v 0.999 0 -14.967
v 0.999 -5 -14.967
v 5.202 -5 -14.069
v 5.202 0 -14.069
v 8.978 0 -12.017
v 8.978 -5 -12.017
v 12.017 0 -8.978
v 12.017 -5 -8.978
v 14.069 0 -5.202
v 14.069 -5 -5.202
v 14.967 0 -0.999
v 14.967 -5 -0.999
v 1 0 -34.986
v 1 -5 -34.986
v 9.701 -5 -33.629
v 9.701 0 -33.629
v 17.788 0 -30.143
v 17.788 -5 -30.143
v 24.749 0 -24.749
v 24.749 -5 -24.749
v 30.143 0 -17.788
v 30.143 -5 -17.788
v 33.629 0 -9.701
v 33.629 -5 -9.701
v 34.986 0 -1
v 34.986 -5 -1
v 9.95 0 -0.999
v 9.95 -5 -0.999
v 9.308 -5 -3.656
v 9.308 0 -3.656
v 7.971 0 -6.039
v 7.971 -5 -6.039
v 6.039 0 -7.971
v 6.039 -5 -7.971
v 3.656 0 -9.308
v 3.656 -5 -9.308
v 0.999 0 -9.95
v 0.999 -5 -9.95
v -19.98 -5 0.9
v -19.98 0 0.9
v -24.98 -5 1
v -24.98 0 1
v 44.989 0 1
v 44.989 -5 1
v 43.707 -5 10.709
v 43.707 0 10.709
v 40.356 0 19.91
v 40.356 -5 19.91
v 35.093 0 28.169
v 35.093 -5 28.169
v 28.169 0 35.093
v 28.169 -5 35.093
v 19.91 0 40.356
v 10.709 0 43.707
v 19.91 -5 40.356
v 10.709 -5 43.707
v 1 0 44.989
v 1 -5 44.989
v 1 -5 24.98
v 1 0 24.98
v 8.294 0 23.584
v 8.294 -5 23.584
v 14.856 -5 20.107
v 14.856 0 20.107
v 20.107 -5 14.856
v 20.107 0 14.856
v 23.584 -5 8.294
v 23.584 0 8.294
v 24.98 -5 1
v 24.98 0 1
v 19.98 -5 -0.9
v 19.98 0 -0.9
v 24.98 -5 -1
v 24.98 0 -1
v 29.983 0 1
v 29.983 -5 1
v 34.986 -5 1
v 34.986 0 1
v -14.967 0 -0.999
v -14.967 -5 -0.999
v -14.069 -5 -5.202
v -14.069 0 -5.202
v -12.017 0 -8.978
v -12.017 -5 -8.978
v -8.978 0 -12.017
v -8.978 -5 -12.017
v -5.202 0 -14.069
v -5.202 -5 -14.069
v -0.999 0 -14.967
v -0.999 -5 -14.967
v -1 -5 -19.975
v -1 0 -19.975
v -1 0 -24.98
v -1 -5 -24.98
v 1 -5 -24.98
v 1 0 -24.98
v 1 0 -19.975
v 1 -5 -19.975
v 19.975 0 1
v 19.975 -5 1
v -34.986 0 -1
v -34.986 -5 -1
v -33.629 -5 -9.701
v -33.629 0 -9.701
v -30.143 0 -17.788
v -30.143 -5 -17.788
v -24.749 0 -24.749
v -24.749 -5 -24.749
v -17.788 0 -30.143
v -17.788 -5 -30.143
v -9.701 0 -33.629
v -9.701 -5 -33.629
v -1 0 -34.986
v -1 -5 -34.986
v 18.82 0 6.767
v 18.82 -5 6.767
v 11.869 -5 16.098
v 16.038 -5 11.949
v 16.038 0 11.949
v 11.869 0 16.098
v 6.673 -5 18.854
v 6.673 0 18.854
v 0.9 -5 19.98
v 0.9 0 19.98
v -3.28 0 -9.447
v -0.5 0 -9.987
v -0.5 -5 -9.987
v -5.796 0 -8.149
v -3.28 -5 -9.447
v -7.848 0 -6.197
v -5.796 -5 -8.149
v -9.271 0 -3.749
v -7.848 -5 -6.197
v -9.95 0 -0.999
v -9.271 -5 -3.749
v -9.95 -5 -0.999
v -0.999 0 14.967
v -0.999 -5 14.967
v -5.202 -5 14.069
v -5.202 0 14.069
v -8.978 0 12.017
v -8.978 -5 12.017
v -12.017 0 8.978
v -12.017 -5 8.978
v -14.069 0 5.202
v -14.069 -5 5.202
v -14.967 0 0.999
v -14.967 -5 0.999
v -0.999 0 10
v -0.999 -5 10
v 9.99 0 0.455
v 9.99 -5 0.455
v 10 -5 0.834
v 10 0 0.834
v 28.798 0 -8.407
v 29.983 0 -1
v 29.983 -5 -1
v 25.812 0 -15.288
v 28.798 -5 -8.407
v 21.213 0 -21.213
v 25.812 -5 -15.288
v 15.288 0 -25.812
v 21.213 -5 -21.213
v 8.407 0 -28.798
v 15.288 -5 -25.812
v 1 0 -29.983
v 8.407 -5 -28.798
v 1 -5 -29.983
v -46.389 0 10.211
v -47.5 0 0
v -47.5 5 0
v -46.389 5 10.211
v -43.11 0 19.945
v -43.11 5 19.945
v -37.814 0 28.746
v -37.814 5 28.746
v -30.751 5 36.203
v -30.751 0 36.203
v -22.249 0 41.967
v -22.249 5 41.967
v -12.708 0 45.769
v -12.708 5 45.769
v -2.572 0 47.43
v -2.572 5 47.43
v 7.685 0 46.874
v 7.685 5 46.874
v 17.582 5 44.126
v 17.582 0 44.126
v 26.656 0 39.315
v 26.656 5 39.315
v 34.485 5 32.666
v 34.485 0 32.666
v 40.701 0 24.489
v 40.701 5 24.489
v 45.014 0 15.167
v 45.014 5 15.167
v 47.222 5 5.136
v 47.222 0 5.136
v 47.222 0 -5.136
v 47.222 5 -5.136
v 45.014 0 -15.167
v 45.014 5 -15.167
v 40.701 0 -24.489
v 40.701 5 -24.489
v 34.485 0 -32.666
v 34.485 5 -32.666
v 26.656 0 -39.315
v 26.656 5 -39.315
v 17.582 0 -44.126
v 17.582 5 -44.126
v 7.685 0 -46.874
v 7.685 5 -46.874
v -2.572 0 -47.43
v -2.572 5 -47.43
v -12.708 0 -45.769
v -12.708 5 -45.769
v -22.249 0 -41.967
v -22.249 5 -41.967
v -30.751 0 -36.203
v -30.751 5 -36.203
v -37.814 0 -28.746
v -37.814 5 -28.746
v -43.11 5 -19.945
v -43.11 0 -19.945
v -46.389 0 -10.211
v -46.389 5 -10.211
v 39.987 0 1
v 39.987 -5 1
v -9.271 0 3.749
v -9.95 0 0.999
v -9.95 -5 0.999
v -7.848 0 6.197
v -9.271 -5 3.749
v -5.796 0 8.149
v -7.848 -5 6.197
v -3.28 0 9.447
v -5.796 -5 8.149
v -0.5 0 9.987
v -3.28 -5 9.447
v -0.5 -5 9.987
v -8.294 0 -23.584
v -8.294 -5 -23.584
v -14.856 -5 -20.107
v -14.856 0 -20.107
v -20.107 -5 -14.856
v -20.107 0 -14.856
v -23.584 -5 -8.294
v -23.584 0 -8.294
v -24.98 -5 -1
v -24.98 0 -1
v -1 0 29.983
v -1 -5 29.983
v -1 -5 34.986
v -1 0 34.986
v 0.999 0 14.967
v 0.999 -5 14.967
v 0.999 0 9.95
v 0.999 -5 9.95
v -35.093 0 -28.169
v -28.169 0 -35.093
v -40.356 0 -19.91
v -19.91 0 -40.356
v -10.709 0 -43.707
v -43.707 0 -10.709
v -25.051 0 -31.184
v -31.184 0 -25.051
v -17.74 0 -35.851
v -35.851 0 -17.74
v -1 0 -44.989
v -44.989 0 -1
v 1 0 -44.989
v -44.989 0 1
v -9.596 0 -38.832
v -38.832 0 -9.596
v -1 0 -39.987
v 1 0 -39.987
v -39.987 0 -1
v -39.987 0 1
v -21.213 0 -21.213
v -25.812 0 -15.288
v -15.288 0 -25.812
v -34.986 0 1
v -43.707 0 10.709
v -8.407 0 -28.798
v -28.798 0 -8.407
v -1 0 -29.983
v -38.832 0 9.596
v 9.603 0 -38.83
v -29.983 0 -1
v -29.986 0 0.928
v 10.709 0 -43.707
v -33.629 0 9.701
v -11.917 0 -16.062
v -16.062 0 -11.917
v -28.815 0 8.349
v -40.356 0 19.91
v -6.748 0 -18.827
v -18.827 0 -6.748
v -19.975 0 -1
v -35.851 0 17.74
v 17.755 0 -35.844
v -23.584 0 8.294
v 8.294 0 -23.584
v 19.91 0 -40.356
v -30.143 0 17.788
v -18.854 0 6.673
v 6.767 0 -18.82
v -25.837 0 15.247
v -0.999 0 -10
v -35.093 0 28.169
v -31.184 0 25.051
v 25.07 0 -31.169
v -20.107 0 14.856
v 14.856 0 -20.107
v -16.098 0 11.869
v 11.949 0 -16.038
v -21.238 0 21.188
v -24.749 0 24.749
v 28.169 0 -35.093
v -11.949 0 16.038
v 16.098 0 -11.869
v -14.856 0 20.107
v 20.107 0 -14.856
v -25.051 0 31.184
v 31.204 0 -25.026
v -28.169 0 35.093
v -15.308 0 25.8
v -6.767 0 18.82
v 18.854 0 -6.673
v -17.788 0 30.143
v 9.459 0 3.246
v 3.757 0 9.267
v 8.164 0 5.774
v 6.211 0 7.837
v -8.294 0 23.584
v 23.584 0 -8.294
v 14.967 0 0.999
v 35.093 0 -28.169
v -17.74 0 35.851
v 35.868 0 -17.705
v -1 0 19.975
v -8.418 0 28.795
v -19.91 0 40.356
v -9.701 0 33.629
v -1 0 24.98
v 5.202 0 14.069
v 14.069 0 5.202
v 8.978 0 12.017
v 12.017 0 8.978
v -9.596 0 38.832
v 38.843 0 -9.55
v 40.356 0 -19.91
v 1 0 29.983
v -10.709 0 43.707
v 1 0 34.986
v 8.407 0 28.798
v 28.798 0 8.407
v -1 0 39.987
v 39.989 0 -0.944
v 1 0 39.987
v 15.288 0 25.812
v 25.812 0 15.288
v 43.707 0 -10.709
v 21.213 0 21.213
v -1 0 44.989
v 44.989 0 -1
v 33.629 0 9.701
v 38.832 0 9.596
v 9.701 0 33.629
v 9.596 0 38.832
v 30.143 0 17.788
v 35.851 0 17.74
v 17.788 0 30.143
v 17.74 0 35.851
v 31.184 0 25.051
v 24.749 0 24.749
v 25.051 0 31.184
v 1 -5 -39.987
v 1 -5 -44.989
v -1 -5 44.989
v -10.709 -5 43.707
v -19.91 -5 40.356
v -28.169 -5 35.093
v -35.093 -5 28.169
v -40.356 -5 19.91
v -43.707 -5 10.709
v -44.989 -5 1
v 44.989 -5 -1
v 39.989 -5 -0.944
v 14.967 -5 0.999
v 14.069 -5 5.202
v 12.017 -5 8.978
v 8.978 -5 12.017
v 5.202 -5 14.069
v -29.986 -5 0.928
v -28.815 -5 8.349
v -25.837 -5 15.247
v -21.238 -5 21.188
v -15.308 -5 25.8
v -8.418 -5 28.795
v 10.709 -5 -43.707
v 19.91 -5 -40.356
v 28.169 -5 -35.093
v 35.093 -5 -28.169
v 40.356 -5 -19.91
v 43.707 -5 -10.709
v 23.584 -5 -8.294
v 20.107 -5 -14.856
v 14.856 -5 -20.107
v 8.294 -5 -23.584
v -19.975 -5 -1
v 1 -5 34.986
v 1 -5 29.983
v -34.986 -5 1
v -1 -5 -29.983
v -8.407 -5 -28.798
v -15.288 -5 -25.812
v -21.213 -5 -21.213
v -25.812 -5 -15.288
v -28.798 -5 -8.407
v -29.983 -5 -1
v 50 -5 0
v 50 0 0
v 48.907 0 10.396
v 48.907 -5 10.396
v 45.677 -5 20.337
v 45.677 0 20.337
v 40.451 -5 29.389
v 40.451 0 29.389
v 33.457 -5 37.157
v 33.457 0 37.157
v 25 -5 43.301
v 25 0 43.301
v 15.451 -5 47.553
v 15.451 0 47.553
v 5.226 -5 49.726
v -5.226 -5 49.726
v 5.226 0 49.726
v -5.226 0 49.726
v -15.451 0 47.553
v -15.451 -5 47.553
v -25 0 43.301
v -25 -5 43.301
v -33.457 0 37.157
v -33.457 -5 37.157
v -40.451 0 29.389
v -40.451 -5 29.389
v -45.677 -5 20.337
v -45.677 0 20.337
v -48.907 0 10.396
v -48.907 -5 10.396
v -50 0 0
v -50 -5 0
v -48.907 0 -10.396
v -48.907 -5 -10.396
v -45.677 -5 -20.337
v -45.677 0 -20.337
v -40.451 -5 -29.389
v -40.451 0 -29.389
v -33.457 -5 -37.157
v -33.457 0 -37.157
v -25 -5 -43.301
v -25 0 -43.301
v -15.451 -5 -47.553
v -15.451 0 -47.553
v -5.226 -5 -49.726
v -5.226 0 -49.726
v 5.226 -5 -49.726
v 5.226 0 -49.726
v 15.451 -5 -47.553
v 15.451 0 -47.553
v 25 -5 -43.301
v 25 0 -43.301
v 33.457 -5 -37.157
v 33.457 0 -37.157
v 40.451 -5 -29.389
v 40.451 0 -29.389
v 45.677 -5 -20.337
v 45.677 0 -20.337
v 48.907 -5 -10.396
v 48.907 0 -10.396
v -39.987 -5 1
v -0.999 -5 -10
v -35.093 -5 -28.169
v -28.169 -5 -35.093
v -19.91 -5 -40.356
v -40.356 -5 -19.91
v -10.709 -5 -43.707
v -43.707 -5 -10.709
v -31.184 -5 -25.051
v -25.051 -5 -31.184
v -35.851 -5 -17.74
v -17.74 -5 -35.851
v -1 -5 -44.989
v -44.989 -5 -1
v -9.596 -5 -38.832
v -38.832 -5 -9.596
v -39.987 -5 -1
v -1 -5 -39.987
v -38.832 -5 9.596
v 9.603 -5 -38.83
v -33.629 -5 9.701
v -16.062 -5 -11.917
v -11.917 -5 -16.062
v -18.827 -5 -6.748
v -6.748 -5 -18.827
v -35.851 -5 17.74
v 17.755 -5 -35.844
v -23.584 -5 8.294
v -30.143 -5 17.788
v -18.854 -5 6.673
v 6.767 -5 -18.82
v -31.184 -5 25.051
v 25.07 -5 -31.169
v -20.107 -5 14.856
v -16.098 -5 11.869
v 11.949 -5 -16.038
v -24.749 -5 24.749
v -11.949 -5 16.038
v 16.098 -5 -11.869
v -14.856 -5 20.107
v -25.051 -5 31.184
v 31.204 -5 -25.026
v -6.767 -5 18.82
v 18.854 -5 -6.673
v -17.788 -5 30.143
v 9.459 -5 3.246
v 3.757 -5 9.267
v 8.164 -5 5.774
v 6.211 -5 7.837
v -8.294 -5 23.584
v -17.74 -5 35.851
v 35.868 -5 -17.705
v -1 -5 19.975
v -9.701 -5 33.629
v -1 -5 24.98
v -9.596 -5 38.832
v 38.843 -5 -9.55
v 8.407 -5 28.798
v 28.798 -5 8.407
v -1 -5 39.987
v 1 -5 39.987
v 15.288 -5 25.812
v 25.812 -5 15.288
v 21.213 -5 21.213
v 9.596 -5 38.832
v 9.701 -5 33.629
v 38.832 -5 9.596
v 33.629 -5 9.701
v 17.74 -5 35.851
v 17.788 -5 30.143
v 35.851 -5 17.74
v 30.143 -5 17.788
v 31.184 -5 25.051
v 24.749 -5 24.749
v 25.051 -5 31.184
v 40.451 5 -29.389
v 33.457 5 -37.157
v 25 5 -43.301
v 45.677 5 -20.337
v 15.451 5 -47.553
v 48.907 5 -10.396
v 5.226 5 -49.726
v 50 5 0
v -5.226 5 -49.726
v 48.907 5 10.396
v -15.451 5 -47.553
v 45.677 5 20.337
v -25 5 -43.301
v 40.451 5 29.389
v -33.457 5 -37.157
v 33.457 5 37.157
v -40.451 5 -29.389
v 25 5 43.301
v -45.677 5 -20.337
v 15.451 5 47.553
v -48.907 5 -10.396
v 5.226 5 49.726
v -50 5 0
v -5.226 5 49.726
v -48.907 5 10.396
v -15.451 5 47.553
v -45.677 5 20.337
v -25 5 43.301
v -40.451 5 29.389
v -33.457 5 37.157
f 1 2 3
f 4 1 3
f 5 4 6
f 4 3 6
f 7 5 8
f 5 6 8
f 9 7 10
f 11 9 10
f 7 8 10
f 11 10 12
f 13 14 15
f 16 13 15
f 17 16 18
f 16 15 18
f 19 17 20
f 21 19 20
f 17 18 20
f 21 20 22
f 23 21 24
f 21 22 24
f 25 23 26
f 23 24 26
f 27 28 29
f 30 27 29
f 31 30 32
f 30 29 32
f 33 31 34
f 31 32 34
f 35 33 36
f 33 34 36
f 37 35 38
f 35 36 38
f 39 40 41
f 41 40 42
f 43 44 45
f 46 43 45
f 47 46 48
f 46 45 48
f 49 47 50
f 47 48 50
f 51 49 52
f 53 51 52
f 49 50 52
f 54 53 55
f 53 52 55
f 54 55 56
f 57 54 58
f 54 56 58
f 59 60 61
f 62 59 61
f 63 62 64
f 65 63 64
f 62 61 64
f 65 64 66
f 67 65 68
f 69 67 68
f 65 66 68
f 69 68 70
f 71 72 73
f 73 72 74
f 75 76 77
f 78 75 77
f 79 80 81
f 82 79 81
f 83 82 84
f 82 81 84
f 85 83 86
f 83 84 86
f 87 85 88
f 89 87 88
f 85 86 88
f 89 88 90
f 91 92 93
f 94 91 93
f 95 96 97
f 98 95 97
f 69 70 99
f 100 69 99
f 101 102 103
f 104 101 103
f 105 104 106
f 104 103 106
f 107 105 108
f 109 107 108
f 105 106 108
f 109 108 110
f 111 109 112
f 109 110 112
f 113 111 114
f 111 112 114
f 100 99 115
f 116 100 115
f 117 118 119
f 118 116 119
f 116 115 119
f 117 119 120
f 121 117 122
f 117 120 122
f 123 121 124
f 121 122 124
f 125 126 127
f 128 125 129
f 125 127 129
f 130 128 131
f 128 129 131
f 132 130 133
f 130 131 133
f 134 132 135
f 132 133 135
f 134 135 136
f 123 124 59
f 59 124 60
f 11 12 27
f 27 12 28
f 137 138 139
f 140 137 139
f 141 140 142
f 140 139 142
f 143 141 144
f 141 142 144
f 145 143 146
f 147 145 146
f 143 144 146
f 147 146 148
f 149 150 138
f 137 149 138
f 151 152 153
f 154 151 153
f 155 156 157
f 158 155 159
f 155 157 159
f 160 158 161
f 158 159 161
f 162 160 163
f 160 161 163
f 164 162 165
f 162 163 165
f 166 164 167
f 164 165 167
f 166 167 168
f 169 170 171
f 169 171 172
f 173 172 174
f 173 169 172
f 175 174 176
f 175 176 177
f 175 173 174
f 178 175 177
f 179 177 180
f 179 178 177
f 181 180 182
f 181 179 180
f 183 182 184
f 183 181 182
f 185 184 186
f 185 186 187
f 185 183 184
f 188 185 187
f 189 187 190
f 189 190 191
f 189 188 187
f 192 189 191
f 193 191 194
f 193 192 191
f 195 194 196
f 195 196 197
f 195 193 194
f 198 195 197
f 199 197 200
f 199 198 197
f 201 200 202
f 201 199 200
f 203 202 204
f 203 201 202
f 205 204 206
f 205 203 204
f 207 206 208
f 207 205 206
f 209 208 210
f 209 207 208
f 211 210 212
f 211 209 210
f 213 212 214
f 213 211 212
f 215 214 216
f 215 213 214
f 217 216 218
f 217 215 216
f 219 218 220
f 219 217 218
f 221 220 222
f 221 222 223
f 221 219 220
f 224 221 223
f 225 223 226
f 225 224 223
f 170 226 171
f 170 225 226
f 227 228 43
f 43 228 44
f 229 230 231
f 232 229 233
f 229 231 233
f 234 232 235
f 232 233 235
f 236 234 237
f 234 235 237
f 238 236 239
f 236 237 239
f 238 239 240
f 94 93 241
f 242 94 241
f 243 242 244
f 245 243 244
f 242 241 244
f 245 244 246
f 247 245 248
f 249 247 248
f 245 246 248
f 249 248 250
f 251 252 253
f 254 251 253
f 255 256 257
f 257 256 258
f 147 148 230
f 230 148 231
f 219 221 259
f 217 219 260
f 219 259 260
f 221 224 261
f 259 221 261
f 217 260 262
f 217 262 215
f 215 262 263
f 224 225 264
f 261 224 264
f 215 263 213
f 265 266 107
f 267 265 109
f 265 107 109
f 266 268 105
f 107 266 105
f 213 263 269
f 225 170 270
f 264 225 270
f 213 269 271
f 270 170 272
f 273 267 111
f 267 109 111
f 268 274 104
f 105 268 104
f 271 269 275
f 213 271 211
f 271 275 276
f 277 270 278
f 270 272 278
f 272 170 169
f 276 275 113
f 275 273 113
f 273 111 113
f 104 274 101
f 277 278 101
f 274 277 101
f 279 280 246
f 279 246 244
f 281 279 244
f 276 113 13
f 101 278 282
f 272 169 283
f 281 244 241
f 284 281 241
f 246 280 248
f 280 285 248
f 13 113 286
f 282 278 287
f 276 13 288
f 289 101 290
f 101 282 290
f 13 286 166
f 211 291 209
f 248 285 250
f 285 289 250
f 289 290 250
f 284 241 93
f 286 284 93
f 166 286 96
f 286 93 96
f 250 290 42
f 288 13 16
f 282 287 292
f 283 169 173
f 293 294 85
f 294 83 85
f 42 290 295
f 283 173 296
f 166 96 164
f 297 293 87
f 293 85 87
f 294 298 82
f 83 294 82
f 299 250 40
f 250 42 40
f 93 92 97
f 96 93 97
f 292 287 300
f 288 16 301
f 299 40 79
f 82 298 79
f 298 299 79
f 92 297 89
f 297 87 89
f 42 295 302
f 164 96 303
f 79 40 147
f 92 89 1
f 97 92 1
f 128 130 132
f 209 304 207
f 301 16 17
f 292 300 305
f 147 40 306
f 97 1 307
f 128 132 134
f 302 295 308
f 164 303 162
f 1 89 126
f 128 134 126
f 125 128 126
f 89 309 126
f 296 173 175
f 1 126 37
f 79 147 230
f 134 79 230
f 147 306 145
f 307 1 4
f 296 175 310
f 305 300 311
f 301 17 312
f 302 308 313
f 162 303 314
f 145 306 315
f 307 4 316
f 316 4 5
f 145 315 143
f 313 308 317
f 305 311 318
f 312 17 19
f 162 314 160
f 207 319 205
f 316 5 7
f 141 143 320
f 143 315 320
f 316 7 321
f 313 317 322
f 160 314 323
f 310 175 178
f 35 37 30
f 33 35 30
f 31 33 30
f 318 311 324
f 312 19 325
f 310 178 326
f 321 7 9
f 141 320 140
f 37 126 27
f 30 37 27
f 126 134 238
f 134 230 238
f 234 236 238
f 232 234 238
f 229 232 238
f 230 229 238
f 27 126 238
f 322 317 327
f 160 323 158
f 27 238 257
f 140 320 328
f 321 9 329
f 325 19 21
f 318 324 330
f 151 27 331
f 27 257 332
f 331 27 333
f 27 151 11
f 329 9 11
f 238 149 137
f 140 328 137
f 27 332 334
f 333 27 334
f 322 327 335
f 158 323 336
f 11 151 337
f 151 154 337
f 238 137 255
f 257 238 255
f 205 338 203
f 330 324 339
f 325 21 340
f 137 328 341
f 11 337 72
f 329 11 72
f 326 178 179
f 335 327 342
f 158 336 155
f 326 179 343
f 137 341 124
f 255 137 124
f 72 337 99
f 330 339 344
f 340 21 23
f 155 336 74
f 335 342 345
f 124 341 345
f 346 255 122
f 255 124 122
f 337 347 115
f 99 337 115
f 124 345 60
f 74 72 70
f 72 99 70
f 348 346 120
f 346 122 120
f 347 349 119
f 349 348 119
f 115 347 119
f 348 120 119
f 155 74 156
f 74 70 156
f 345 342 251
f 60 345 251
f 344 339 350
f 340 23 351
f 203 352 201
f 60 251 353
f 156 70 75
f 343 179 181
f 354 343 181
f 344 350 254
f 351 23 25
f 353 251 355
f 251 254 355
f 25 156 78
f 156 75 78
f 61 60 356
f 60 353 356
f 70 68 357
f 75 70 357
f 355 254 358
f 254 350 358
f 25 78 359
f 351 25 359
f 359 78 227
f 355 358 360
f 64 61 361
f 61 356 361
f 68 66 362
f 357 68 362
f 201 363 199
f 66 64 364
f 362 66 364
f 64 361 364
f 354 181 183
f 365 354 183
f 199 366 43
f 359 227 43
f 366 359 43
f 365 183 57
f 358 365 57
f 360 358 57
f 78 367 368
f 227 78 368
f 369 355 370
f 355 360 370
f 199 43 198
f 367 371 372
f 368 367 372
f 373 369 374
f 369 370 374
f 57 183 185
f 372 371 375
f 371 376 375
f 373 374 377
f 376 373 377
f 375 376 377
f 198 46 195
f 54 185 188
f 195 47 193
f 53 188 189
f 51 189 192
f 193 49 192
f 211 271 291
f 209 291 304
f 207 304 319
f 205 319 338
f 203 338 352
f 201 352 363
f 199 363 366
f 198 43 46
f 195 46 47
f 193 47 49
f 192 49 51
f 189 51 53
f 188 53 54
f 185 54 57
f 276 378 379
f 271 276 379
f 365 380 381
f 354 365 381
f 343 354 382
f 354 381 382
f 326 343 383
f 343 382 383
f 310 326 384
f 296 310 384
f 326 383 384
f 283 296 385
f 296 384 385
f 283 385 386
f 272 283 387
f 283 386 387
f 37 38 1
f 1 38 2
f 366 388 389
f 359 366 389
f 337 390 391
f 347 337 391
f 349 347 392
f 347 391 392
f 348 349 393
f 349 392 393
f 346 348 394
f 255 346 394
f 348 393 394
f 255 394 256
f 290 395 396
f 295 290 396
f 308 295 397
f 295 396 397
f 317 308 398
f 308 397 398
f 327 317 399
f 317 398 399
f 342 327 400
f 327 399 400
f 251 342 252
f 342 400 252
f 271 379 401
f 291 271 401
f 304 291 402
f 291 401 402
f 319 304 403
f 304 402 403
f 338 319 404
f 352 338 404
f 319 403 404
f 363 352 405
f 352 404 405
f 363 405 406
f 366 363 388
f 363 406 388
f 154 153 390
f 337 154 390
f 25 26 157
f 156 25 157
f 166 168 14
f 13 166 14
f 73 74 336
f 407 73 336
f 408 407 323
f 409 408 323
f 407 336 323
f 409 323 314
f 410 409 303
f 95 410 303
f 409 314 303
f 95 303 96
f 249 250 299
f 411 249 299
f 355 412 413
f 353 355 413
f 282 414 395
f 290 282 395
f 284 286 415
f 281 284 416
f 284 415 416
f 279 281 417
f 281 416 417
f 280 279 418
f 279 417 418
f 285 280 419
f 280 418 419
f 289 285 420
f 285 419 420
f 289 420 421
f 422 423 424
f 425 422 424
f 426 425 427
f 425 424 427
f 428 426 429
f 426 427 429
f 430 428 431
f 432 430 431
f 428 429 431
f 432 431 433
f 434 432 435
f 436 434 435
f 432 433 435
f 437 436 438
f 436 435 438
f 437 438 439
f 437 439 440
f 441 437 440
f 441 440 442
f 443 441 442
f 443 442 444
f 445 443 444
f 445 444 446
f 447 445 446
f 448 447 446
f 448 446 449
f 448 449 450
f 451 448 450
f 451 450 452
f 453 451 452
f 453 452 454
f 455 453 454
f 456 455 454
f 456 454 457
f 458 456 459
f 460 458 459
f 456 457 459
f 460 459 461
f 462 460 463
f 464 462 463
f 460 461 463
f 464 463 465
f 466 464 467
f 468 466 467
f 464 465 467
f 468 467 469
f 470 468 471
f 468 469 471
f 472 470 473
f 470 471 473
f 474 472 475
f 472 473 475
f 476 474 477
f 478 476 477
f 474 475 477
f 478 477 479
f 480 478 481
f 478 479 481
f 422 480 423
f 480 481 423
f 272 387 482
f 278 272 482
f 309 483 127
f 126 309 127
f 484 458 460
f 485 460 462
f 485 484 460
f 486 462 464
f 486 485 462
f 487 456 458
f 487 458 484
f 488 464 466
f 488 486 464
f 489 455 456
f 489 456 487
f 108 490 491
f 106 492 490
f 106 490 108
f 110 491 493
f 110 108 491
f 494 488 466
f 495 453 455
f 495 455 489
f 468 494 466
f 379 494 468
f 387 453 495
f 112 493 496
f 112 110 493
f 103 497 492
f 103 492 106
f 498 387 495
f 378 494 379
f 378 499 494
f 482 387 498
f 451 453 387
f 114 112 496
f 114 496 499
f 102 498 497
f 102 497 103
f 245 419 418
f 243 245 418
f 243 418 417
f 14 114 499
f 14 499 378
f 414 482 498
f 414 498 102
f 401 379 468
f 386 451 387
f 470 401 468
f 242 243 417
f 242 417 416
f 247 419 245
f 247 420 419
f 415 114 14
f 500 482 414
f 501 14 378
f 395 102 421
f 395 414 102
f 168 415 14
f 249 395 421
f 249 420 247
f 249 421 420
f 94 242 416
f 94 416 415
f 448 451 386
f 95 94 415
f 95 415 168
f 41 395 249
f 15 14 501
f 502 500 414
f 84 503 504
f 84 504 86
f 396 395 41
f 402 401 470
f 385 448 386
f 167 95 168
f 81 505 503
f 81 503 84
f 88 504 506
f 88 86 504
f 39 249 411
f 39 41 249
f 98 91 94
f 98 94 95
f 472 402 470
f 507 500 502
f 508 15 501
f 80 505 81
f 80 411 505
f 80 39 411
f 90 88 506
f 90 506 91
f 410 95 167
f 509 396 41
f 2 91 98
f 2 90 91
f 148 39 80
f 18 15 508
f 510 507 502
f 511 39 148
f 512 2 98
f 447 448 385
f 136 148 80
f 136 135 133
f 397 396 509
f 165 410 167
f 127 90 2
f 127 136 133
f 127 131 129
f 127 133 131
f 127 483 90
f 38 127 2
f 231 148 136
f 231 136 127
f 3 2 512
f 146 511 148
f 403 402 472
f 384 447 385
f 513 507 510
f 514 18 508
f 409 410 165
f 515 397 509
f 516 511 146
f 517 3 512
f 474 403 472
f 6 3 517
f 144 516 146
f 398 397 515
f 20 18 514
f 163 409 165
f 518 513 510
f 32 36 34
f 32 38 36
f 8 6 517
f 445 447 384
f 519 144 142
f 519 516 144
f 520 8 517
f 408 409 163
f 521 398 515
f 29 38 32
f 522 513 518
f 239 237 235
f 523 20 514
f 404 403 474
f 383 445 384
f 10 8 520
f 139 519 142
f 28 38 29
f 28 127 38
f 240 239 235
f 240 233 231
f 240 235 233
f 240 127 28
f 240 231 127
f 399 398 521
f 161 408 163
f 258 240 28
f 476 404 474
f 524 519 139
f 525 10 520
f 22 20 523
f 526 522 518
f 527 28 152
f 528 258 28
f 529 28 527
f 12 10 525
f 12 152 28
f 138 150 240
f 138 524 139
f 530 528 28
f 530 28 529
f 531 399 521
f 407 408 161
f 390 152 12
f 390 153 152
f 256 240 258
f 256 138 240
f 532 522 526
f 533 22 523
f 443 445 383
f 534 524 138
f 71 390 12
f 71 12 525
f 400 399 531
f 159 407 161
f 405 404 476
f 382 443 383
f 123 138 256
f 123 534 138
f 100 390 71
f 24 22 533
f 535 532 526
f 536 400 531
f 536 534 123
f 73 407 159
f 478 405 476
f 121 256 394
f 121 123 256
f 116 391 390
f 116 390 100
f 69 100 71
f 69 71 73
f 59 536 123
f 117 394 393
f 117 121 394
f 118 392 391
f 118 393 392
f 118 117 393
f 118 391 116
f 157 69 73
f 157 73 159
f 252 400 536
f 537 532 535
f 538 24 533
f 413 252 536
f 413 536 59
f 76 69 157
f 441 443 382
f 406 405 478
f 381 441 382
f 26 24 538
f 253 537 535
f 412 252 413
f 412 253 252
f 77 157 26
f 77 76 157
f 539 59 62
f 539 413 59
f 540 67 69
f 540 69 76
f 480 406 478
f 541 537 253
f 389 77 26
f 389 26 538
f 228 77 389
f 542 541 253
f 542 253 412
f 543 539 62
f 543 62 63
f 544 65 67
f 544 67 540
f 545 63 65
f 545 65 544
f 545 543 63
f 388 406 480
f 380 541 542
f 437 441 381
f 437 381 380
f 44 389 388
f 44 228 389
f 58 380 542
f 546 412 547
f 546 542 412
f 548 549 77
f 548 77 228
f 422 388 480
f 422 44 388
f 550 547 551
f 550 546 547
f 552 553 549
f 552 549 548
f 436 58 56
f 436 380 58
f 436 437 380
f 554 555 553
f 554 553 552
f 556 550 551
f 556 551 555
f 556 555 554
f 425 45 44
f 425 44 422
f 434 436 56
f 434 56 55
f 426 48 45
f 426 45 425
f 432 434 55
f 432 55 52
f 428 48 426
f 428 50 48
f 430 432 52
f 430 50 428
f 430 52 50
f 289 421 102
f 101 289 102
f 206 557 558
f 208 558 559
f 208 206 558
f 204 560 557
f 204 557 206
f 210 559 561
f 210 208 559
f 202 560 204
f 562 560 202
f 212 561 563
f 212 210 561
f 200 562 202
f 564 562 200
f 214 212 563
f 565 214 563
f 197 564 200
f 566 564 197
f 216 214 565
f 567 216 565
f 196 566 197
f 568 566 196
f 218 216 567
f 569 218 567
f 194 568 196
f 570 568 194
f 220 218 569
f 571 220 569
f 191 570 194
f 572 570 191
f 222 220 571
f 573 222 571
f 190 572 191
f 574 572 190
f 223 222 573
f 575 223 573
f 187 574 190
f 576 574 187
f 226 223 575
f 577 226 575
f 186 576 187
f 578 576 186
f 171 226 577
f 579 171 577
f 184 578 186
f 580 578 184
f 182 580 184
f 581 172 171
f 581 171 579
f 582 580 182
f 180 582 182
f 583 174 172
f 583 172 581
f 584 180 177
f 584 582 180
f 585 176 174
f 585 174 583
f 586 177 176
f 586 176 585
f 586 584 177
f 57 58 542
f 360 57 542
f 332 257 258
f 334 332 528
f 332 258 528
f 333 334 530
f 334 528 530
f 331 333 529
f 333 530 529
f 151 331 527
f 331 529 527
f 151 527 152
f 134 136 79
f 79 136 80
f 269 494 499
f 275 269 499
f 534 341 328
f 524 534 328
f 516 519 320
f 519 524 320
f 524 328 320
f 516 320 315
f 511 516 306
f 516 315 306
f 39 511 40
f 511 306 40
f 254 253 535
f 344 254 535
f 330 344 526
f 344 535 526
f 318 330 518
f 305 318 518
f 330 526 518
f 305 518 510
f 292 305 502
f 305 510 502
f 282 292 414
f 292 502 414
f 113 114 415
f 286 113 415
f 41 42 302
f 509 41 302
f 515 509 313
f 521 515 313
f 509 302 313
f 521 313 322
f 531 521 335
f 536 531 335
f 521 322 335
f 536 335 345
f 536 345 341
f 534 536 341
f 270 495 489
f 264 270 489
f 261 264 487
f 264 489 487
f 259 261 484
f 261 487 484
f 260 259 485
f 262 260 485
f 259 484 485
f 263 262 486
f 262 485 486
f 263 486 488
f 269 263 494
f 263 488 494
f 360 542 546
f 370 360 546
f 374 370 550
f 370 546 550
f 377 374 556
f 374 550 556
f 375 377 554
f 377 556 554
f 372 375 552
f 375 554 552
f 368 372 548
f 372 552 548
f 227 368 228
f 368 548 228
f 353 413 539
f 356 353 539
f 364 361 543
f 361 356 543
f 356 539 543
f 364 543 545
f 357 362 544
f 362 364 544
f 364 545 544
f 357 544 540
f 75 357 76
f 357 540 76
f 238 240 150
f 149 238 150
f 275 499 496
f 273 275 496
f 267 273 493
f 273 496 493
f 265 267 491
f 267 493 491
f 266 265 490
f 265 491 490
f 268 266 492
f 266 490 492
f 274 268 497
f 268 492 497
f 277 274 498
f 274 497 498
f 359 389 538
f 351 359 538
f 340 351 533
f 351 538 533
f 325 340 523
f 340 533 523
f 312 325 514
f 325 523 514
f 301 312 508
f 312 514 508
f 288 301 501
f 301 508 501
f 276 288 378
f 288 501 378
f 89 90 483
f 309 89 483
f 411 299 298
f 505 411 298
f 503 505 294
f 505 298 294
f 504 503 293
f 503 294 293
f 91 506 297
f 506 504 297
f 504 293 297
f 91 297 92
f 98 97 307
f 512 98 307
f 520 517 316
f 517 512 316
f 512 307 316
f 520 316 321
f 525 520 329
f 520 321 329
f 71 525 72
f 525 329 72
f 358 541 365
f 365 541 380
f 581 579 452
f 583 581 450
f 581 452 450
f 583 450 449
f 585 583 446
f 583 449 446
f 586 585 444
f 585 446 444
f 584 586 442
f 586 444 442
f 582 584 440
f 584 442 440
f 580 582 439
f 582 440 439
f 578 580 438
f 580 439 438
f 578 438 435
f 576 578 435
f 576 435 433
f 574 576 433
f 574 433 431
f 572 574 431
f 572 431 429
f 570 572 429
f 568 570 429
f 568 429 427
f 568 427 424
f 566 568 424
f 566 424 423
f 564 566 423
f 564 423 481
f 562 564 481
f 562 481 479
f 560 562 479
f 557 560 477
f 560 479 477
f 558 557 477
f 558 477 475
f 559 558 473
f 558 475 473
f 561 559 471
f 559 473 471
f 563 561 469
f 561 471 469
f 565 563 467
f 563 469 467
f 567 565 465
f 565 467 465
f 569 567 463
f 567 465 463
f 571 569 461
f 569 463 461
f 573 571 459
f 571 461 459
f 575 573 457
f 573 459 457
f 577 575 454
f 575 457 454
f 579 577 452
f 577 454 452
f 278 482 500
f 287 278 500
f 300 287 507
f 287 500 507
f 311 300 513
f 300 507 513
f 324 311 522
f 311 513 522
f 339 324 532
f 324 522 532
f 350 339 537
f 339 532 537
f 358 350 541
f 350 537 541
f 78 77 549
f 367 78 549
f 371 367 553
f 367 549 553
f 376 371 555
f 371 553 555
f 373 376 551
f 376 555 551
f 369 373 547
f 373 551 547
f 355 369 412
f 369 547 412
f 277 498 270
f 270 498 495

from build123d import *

# Parameters (mm, degrees)
F0_R      = 50
F1_DEPTH  = 5
F3_DEPTH  = 25
F5_DEPTH  = 25
F7_DEPTH  = 25
F9_DEPTH  = 25
F10_R     = 50
F10_R_2   = 47.5
F11_DEPTH = 5


with BuildPart() as f1:
    # F0 (on Front) → F1 (new body)
    with BuildSketch(Plane.XZ):
        Circle(F0_R)
    extrude(amount=F1_DEPTH)

    # F2 (on face) → F3 (cut)
    with BuildSketch(Plane.XZ.offset(5)):
        with BuildLine():
            Line((39.98749959, 0.9999382697), (44.9888888889, 0.9999382697))
            ThreePointArc((44.9888888889, 0.9999382697), (31.8198051534, 31.8198051534), (0.9999382697, 44.9888888889))
            Line((0.9999382697, 44.9888888889), (0.9999382697, 39.98749959))
            ThreePointArc((0.9999382697, 39.98749959), (28.2842712475, 28.2842712475), (39.98749959, 0.9999382697))
        make_face()
        with BuildLine():
            ThreePointArc((0.9999382697, -44.9888888889), (31.8198051534, -31.8198051534), (44.9888888889, -0.9999382697))
            Line((44.9888888889, -0.9999382697), (39.9888503033, -0.9443788557))
            ThreePointArc((39.9888503033, -0.9443788557), (28.3039134456, -28.2646153992), (0.9999382697, -39.98749959))
            Line((0.9999382697, -39.98749959), (0.9999382697, -44.9888888889))
        make_face()
        with BuildLine():
            Line((-0.9999382697, 39.98749959), (-0.9999382697, 44.9888888889))
            ThreePointArc((-0.9999382697, 44.9888888889), (-31.8198051534, 31.8198051534), (-44.9888888889, 0.9999382697))
            Line((-44.9888888889, 0.9999382697), (-39.98749959, 0.9999382697))
            ThreePointArc((-39.98749959, 0.9999382697), (-28.2842712475, 28.2842712475), (-0.9999382697, 39.98749959))
        make_face()
        with BuildLine():
            ThreePointArc((-44.9888888889, -0.9999382697), (-31.8198051534, -31.8198051534), (-0.9999382697, -44.9888888889))
            Line((-0.9999382697, -44.9888888889), (-0.9999382697, -39.98749959))
            ThreePointArc((-0.9999382697, -39.98749959), (-28.2842712475, -28.2842712475), (-39.98749959, -0.9999382697))
            Line((-39.98749959, -0.9999382697), (-44.9888888889, -0.9999382697))
        make_face()
    extrude(amount=-F3_DEPTH, mode=Mode.SUBTRACT)

    # F4 (on face) → F5 (cut)
    with BuildSketch(Plane.XZ.offset(5)):
        with BuildLine():
            Line((-0.999897954, 29.9833321044), (-0.999897954, 34.9857142857))
            ThreePointArc((-0.999897954, 34.9857142857), (-24.7487373415, 24.7487373415), (-34.9857142857, 0.999897954))
            Line((-34.9857142857, 0.999897954), (-29.9856292313, 0.9284608776))
            ThreePointArc((-29.9856292313, 0.9284608776), (-21.2384582595, 21.1879185094), (-0.999897954, 29.9833321044))
        make_face()
        with BuildLine():
            Line((-29.9833321044, -0.999897954), (-34.9857142857, -0.999897954))
            ThreePointArc((-34.9857142857, -0.999897954), (-24.7487373415, -24.7487373415), (-0.999897954, -34.9857142857))
            Line((-0.999897954, -34.9857142857), (-0.999897954, -29.9833321044))
            ThreePointArc((-0.999897954, -29.9833321044), (-21.2132034356, -21.2132034356), (-29.9833321044, -0.999897954))
        make_face()
        with BuildLine():
            ThreePointArc((0.999897954, -34.9857142857), (24.7487373415, -24.7487373415), (34.9857142857, -0.999897954))
            Line((34.9857142857, -0.999897954), (29.9833321044, -0.999897954))
            ThreePointArc((29.9833321044, -0.999897954), (21.2132034356, -21.2132034356), (0.999897954, -29.9833321044))
            Line((0.999897954, -29.9833321044), (0.999897954, -34.9857142857))
        make_face()
        with BuildLine():
            ThreePointArc((34.9857131335, 0.9999382697), (24.7487230819, 24.7487516011), (0.999897954, 34.9857142857))
            Line((0.999897954, 34.9857142857), (0.999897954, 29.9833321044))
            ThreePointArc((0.999897954, 29.9833321044), (21.2131891739, 21.2132176973), (29.9833307599, 0.9999382697))
            Line((29.9833307599, 0.9999382697), (34.9857131335, 0.9999382697))
        make_face()
    extrude(amount=-F5_DEPTH, mode=Mode.SUBTRACT)

    # F6 (on face) → F7 (cut)
    with BuildSketch(Plane(origin=(0, 0, 0), x_dir=(-1, 0, 0), z_dir=(0, 1, 0))):
        with BuildLine():
            Line((19.9797498734, 0.8997749705), (24.98, 0.99979998))
            ThreePointArc((24.98, 0.99979998), (17.6776695297, 17.6776695297), (0.99979998, 24.98))
            Line((0.99979998, 24.98), (0.99979998, 19.974994368))
            ThreePointArc((0.99979998, 19.974994368), (14.1774954339, 14.106687181), (19.9797498734, 0.8997749705))
        make_face()
        with BuildLine():
            ThreePointArc((0.99979998, -24.98), (17.6776695297, -17.6776695297), (24.98, -0.99979998))
            Line((24.98, -0.99979998), (19.974994368, -0.99979998))
            ThreePointArc((19.974994368, -0.99979998), (14.1421356237, -14.1421356237), (0.99979998, -19.974994368))
            Line((0.99979998, -19.974994368), (0.99979998, -24.98))
        make_face()
        with BuildLine():
            ThreePointArc((-24.98, -0.99979998), (-17.6776695297, -17.6776695297), (-0.99979998, -24.98))
            Line((-0.99979998, -24.98), (-0.99979998, -19.974994368))
            ThreePointArc((-0.99979998, -19.974994368), (-14.1774954339, -14.106687181), (-19.9797498734, -0.8997749705))
            Line((-19.9797498734, -0.8997749705), (-24.98, -0.99979998))
        make_face()
        with BuildLine():
            Line((-0.8997749705, 19.9797498734), (-0.99979998, 24.98))
            ThreePointArc((-0.99979998, 24.98), (-17.6776695297, 17.6776695297), (-24.98, 0.99979998))
            Line((-24.98, 0.99979998), (-19.974994368, 0.99979998))
            ThreePointArc((-19.974994368, 0.99979998), (-14.106687181, 14.1774954339), (-0.8997749705, 19.9797498734))
        make_face()
    extrude(amount=-F7_DEPTH, mode=Mode.SUBTRACT)

    # F8 (on face) → F9 (cut)
    with BuildSketch(Plane.XZ.offset(5)):
        with BuildLine():
            Line((-0.99944429, 10), (-0.99944429, 14.9666666667))
            ThreePointArc((-0.99944429, 14.9666666667), (-10.6066017178, 10.6066017178), (-14.9666666667, 0.99944429))
            Line((-14.9666666667, 0.99944429), (-9.9499302063, 0.99944429))
            ThreePointArc((-9.9499302063, 0.99944429), (-6.8917841678, 7.2459168492), (-0.5000354957, 9.9874904006))
            Line((-0.5000354957, 9.9874904006), (-0.99944429, 10))
        make_face()
        with BuildLine():
            Line((10, 0.8337966825), (14.9666666667, 0.99944429))
            ThreePointArc((14.9666666667, 0.99944429), (10.6066017178, 10.6066017178), (0.99944429, 14.9666666667))
            Line((0.99944429, 14.9666666667), (0.99944429, 9.9499302063))
            ThreePointArc((0.99944429, 9.9499302063), (7.2614861704, 6.8753777058), (9.989650171, 0.4548510314))
            Line((9.989650171, 0.4548510314), (10, 0.8337966825))
        make_face()
        with BuildLine():
            ThreePointArc((0.99944429, -14.9666666667), (10.6066017178, -10.6066017178), (14.9666666667, -0.99944429))
            Line((14.9666666667, -0.99944429), (9.9499302063, -0.99944429))
            ThreePointArc((9.9499302063, -0.99944429), (7.0710678119, -7.0710678119), (0.99944429, -9.9499302063))
            Line((0.99944429, -9.9499302063), (0.99944429, -14.9666666667))
        make_face()
        with BuildLine():
            ThreePointArc((-14.9666666667, -0.99944429), (-10.6066017178, -10.6066017178), (-0.99944429, -14.9666666667))
            Line((-0.99944429, -14.9666666667), (-0.99944429, -10))
            Line((-0.99944429, -10), (-0.5000354957, -9.9874904006))
            ThreePointArc((-0.5000354957, -9.9874904006), (-6.8917841678, -7.2459168492), (-9.9499302063, -0.99944429))
            Line((-9.9499302063, -0.99944429), (-14.9666666667, -0.99944429))
        make_face()
    extrude(amount=-F9_DEPTH, mode=Mode.SUBTRACT)

    # F10 (on face) → F11 (join)
    with BuildSketch(Plane(origin=(0, 0, 0), x_dir=(-1, 0, 0), z_dir=(0, 1, 0))):
        Circle(F10_R)
        Circle(F10_R_2, mode=Mode.SUBTRACT)
    extrude(amount=F11_DEPTH)


solid = f1.part
